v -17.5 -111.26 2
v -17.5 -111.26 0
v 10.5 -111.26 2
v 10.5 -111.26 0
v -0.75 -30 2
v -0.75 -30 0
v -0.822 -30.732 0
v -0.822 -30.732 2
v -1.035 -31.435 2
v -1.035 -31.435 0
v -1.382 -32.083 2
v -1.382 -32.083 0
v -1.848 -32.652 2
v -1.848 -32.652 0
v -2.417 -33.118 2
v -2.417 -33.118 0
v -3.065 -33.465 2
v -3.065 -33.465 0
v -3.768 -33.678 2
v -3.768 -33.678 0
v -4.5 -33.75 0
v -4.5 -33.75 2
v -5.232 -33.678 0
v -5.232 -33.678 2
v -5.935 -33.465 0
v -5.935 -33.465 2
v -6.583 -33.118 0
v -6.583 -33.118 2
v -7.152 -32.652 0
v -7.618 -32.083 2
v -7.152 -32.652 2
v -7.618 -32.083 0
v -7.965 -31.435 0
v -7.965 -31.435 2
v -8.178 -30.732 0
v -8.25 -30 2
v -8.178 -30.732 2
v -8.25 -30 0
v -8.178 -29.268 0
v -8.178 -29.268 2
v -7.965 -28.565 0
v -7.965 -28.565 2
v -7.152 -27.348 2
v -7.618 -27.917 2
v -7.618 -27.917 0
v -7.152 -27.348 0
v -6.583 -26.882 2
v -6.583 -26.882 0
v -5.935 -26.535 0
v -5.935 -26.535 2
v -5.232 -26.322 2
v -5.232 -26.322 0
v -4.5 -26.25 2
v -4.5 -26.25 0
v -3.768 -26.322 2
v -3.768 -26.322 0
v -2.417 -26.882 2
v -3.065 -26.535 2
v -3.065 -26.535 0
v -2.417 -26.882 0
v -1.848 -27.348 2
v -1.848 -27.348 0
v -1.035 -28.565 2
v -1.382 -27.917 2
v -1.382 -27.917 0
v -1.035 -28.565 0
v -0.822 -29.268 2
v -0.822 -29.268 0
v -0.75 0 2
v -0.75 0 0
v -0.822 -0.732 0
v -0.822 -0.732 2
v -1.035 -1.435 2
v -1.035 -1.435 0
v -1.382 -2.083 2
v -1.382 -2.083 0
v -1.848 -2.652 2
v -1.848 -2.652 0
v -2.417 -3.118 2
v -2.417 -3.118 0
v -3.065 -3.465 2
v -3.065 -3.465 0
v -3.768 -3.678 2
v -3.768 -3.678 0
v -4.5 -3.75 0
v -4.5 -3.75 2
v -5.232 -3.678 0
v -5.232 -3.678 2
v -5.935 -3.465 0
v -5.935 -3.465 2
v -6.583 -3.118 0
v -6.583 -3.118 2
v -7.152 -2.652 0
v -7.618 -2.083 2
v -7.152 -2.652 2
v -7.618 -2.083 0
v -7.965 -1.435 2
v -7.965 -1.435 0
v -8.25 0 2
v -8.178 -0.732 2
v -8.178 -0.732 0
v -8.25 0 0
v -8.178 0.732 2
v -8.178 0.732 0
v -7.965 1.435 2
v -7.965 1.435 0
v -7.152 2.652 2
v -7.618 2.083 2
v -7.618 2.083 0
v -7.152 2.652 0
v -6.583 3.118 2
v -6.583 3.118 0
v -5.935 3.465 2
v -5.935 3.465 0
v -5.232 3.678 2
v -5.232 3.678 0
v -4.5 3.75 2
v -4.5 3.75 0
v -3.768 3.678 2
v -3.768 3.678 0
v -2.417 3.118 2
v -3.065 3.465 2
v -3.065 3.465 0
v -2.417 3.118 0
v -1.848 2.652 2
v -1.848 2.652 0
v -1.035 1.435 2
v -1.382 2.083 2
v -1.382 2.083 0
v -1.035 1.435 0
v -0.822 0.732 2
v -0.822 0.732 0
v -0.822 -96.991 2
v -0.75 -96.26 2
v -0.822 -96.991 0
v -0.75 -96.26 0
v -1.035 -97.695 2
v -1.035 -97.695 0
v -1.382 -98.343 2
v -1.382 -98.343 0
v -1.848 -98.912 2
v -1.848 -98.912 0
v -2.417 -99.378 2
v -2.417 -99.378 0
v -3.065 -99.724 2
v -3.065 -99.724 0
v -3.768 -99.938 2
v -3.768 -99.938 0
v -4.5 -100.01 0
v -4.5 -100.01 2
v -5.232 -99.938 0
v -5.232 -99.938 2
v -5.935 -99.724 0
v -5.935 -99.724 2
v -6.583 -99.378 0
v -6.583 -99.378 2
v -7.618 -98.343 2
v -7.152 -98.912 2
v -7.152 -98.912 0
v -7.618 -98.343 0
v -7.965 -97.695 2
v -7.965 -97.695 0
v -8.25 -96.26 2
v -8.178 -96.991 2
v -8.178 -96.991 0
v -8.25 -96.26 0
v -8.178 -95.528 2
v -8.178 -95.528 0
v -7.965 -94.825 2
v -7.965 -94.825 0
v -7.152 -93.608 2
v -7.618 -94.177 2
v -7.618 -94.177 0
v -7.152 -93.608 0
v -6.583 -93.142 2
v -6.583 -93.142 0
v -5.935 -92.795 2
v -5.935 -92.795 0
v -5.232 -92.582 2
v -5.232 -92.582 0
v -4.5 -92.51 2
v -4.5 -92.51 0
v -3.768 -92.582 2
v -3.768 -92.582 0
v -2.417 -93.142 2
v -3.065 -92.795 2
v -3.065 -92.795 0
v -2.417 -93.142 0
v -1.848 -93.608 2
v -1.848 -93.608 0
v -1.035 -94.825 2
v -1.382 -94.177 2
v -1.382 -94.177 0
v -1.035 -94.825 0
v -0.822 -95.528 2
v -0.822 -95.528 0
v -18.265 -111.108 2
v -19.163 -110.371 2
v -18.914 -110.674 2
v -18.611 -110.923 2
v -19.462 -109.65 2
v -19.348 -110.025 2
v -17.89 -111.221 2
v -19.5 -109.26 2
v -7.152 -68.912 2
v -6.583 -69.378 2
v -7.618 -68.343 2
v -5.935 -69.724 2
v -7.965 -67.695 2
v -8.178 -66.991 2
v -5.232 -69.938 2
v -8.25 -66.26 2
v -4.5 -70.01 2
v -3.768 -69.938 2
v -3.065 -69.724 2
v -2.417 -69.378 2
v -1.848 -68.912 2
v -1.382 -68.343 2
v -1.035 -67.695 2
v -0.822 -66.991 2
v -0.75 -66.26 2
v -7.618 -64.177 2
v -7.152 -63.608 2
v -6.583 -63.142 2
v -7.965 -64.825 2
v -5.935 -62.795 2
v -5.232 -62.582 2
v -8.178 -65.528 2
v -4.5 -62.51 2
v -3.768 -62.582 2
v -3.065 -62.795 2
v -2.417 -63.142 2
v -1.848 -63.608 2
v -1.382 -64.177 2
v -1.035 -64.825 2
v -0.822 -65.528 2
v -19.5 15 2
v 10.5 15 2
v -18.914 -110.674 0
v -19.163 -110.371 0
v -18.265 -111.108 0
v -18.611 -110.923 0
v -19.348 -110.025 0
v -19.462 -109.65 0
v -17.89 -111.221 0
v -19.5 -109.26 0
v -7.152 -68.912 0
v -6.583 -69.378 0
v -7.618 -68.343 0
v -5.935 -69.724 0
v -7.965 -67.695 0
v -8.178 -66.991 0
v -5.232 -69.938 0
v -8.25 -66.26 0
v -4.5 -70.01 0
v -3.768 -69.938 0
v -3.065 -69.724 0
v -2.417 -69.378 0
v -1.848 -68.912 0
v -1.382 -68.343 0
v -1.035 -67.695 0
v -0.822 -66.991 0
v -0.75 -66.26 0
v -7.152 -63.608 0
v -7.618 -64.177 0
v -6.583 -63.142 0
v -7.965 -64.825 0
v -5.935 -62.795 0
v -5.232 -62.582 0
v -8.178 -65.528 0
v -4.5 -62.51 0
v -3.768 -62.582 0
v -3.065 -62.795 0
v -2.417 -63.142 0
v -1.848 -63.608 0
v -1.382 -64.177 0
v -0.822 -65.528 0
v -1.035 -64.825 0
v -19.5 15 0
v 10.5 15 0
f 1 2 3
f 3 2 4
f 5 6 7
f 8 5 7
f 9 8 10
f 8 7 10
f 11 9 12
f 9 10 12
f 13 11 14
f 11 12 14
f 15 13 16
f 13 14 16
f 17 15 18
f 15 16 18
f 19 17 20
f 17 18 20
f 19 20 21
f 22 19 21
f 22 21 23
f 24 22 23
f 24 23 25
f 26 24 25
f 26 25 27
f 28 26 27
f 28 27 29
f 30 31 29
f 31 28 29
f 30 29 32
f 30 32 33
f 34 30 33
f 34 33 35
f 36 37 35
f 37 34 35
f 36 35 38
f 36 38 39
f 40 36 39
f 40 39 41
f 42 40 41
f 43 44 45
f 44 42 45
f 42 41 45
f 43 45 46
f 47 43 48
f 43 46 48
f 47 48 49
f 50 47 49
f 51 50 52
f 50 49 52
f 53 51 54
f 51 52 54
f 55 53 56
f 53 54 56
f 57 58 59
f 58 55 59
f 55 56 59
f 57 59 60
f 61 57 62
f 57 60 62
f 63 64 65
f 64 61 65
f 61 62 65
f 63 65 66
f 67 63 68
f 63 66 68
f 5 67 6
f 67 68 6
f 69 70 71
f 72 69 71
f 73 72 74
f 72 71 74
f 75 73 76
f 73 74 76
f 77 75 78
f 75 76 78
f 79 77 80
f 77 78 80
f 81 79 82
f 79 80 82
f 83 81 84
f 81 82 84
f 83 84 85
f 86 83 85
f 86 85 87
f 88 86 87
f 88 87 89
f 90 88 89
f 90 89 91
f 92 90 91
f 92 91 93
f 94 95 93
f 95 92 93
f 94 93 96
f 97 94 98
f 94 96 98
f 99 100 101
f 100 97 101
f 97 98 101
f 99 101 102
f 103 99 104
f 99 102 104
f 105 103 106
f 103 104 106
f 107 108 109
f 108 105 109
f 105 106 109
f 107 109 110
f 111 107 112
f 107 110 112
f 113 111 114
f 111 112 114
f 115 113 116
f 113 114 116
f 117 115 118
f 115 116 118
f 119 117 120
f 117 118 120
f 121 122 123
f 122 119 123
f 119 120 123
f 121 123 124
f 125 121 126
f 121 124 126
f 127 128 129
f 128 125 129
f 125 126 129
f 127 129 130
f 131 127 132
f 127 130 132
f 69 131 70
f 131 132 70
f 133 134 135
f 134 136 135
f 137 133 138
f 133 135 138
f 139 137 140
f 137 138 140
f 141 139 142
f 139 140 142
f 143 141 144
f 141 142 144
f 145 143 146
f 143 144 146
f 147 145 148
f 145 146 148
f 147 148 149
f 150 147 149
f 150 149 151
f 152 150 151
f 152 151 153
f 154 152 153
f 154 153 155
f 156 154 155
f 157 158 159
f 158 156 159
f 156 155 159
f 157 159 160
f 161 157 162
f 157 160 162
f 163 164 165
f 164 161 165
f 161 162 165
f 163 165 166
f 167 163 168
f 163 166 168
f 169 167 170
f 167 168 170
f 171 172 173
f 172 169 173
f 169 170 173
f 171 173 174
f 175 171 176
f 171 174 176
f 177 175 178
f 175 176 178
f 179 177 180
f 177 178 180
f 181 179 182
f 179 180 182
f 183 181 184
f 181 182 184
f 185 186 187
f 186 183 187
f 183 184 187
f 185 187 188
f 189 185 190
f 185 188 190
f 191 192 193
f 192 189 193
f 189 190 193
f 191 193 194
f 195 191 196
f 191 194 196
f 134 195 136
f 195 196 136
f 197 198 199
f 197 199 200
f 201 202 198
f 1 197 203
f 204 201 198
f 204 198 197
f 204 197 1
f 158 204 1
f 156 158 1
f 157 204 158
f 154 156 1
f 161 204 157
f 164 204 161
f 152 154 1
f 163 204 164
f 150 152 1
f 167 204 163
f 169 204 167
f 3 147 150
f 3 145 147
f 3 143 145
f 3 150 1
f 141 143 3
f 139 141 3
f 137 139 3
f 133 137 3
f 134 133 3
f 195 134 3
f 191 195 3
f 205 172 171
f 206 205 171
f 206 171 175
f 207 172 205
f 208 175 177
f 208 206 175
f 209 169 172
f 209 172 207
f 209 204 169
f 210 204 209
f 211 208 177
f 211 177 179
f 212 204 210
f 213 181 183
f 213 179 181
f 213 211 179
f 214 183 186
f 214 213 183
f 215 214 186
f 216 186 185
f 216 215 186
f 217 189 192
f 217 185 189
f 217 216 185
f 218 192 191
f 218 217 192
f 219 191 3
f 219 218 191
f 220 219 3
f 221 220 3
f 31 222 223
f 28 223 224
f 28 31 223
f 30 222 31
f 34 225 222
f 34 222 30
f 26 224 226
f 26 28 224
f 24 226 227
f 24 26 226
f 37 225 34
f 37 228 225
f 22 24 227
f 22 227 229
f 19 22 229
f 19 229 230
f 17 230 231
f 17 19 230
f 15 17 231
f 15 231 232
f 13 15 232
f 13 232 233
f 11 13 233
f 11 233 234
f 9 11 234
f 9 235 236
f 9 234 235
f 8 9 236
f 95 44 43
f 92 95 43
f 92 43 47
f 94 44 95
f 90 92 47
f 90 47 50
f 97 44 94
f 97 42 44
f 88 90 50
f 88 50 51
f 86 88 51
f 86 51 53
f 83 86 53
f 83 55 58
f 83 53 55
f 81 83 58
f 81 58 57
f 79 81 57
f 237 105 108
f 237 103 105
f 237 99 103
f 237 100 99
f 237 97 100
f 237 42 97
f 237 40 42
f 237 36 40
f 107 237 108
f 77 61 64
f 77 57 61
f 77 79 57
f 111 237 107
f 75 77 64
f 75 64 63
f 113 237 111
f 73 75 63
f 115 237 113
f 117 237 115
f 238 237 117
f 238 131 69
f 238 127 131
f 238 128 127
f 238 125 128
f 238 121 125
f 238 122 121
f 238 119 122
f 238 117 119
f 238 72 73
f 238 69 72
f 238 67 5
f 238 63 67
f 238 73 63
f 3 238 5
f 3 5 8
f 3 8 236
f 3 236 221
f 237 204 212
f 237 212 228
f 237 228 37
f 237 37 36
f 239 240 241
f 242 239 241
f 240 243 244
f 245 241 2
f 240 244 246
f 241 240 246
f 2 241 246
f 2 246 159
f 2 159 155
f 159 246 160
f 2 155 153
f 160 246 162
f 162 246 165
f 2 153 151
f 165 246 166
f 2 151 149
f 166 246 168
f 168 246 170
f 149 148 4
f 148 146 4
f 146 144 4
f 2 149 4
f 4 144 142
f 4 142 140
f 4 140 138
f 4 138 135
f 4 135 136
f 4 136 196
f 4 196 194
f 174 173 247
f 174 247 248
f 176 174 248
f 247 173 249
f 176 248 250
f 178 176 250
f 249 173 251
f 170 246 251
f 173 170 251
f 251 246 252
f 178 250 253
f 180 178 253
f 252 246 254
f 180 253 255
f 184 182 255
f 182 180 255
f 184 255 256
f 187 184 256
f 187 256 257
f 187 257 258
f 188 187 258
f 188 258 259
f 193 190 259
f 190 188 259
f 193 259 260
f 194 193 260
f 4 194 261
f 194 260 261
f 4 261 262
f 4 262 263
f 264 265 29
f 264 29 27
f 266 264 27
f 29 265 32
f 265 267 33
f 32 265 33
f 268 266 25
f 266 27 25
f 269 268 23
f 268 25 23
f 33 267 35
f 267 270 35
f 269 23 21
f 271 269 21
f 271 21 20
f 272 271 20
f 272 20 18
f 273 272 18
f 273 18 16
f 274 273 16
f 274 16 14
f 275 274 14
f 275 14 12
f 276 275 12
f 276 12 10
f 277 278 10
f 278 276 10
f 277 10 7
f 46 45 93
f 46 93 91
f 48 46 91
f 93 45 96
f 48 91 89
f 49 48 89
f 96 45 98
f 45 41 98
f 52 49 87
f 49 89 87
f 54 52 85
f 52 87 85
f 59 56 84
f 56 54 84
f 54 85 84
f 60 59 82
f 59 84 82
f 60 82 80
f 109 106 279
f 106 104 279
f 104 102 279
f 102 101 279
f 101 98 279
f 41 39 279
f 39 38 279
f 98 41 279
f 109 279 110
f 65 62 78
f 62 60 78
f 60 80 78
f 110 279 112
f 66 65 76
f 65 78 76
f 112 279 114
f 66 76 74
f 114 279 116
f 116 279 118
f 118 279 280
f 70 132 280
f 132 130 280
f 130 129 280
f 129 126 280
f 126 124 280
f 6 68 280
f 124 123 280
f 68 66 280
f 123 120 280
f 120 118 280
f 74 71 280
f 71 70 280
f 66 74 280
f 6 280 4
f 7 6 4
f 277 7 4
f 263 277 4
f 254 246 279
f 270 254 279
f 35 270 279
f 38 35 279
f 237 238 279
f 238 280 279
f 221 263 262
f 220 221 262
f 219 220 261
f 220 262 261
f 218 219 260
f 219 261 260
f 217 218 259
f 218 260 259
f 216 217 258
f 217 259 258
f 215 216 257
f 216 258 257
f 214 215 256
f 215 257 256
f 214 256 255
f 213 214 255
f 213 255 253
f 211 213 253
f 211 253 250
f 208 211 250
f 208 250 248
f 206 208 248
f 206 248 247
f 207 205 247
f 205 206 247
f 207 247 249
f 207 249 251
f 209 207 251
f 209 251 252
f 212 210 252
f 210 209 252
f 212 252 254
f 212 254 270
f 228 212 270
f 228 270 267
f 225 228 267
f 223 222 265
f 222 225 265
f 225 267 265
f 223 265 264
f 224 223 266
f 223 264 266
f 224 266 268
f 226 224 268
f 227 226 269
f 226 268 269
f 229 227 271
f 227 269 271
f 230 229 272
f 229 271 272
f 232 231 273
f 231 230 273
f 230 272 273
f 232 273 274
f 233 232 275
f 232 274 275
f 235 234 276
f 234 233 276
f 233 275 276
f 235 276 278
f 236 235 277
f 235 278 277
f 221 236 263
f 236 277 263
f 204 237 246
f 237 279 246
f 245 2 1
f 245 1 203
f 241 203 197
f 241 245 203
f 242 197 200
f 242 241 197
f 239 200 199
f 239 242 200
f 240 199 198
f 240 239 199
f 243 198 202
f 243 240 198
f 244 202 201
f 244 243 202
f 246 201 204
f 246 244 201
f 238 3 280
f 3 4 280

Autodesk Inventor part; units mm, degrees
ref_plane "YZ Plane" through (0, 0, 0) normal (1, 0, 0) x (0, 1, 0)
ref_plane "XZ Plane" through (0, 0, 0) normal (0, 1, 0) x (-1, 0, 0)
ref_plane "XY Plane" through (0, 0, 0) normal (0, 0, 1) x (1, 0, 0)
sketch "Sketch1" plane through (0, 0, 0) normal (0, 0, 1) x (1, 0, 0)
  arc A0 (10.4999, 13) -> (8.4999, 15) centre (8.4999, 13) ccw
  arc A1 (-19.5, -109.2599) -> (-17.5, -111.2599) centre (-17.5, -109.2599) ccw
  line L0 (10.4999, 15) -> (-19.5, 15)
  line L1 (-19.5, 15) -> (-19.5, -111.2599)
  line L2 (-19.5, -111.2599) -> (10.4999, -111.2599)
  line L3 (10.4999, -111.2599) -> (10.4999, 15)
  line L4 (-4.5, -111.2599) -> (-4.5, 15) construction
  circle A2 centre (-4.5, 0) radius 3.75
  circle A3 centre (-4.5, -30) radius 3.75
  circle A4 centre (-4.5, -66.2599) radius 3.75
  circle A5 centre (-4.5, -96.2599) radius 3.75
  point P0 (0, 0)
  dimension "d0" = 29.9999
  dimension "d1" = 126.2599
  dimension "d2" = 7.5
  dimension "d3" = 15
  dimension "d4" = 15
  dimension "d5" = 30
  dimension "d6" = 30
extrude "Plate1" add sketch "Sketch1" along normal blind 2 contours L3 L2 A1 L1 L0 A0 | A0 L0 L3
equation "\"d4\" = d3"
equation "\"d6\" = d5"
equation "\"BendRadius\" = Thickness"
equation "\"BendReliefWidth\" = Thickness"
equation "\"BendReliefDepth\" = 0.5 * Thickness"
equation "\"CornerReliefSize\" = 4 * Thickness"
equation "\"MinimumRemnant\" = 2 * Thickness"
equation "\"TransitionRadius\" = BendRadius"
equation "\"JacobiRadiusSize\" = BendRadius"
equation "\"GapSize\" = Thickness"
equation "\"d7\" = BendRadius"
equation "\"Thickness\" = 2"
properties part number "gabarito-suporte-motor-lateral" material "Wood (Oak)"
